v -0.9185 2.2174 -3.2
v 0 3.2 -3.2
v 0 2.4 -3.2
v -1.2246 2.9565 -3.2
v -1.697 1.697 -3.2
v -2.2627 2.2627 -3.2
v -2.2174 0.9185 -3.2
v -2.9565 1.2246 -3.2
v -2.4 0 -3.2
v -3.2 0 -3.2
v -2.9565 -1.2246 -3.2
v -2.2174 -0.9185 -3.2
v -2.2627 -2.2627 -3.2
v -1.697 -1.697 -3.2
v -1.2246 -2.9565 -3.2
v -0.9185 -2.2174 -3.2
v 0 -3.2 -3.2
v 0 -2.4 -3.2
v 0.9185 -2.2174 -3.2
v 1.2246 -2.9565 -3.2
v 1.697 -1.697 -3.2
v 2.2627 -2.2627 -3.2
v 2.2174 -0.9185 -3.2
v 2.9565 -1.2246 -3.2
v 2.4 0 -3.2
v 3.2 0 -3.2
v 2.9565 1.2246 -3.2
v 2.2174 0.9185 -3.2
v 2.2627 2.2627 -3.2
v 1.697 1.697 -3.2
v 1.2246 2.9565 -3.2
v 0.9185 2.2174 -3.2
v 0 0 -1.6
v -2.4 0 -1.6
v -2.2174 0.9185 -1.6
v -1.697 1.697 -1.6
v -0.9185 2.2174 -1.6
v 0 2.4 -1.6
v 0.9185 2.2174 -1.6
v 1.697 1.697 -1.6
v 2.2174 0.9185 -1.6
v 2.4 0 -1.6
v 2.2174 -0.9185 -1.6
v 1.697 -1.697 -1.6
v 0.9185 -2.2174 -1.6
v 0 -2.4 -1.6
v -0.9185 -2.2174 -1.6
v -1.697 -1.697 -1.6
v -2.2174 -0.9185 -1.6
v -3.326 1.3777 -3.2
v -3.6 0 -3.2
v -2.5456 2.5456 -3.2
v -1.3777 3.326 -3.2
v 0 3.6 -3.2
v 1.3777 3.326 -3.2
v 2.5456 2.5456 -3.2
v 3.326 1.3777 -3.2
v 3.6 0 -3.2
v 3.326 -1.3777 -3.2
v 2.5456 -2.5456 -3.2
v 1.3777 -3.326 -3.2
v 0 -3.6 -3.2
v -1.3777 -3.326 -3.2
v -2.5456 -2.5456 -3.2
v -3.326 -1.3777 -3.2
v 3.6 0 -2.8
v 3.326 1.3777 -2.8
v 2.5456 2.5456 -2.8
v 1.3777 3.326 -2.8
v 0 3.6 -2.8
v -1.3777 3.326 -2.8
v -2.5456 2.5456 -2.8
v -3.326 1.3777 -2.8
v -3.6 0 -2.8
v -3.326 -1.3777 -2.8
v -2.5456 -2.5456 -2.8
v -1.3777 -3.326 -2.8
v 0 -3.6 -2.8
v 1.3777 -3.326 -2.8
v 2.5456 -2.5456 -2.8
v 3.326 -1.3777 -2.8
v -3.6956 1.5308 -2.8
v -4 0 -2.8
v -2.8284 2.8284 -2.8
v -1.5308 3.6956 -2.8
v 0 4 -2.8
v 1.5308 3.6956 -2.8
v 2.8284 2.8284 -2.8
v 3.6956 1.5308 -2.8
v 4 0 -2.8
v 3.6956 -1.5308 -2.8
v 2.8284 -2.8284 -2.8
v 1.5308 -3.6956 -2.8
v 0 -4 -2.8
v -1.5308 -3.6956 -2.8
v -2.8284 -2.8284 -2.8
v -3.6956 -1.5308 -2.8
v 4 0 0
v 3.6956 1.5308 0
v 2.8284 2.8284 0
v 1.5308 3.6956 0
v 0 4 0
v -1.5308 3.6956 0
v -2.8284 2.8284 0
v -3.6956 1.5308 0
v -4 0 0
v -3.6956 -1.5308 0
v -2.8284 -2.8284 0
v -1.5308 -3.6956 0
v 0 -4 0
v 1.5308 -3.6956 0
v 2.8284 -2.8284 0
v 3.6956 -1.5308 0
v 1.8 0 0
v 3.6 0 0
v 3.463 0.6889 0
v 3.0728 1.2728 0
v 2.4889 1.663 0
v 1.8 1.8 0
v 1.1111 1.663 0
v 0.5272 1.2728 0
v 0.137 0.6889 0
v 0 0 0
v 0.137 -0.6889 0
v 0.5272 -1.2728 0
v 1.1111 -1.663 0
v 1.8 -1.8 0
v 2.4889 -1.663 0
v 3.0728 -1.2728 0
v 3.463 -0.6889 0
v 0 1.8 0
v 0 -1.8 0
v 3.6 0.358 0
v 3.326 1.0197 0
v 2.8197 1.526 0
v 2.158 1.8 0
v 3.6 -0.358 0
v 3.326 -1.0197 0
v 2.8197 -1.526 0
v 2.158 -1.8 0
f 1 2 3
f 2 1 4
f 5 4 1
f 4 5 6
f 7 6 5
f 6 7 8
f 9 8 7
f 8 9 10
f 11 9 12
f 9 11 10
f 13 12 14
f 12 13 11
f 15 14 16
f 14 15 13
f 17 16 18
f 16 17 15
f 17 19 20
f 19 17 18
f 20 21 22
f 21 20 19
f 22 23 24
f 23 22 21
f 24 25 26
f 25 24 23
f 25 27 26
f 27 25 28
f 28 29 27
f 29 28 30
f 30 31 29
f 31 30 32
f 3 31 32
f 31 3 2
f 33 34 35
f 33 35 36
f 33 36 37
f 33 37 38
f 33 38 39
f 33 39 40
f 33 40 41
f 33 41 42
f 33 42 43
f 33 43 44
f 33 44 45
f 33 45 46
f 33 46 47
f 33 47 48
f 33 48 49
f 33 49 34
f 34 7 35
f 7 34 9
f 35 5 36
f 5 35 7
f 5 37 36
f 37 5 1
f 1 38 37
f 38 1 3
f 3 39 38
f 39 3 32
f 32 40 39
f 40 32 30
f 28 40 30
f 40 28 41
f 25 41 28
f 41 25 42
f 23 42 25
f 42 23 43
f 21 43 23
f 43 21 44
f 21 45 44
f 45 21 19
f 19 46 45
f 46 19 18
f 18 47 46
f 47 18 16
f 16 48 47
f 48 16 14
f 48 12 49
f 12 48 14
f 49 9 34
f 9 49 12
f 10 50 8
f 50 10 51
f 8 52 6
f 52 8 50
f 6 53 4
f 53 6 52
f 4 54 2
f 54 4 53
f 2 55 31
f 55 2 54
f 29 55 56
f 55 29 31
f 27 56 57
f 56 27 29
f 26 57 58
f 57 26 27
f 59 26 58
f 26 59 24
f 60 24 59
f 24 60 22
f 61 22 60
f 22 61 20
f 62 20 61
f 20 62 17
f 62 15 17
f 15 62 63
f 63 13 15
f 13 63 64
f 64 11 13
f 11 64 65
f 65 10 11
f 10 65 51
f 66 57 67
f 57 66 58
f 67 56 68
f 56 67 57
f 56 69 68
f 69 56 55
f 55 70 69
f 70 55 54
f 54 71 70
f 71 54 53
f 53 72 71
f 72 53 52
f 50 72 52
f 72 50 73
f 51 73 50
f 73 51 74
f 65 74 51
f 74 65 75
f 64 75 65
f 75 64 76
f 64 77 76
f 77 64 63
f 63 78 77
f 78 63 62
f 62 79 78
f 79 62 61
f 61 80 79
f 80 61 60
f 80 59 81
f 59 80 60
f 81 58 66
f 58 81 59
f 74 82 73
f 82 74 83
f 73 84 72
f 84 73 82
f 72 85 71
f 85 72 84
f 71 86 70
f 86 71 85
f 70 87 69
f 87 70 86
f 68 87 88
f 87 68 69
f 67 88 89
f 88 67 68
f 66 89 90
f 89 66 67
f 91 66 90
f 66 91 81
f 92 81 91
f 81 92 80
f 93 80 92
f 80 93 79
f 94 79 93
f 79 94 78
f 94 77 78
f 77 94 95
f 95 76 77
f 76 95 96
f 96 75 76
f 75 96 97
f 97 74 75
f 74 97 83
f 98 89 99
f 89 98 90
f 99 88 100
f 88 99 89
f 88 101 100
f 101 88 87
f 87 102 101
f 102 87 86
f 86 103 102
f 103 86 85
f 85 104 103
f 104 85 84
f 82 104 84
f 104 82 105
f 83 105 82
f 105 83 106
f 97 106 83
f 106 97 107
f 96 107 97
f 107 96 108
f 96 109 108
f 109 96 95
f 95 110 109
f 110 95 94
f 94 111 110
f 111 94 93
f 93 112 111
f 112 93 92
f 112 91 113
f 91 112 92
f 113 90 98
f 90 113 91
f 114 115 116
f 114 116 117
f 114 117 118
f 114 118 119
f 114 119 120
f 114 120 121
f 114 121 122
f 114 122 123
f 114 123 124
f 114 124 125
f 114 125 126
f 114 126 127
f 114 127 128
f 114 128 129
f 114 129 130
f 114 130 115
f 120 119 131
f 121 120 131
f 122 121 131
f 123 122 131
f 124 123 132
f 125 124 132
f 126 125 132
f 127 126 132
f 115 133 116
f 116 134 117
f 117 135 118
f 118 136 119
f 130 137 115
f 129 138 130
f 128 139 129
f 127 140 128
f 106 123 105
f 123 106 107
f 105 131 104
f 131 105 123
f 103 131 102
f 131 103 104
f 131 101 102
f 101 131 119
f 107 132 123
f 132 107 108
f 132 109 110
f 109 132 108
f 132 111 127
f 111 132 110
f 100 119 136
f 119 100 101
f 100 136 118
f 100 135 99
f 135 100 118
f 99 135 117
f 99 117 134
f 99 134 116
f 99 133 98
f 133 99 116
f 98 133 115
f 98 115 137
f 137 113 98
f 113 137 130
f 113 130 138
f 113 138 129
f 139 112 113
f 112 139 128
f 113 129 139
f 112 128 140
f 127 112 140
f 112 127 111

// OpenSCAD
// file: ../p/4-4ring3.scad
use <../lib.scad>
function ldraw_lib__4_4ring3() = [
// 0 Ring  3 x 1.0
// 0 Name: 4-4ring3.dat
// 0 Author: James Jessiman
// 0 !LDRAW_ORG Primitive UPDATE 2009-01
// 0 !LICENSE Licensed under CC BY 4.0 : see CAreadme.txt
// 
// 0 BFC CERTIFY CCW
  [0,"BFC","CERTIFY"],
  [0,"BFC","CCW"],
// 
// 0 !HISTORY 1998-12-15 [PTadmin] Official Update 1998-10
// 0 !HISTORY 2002-04-05 [hafhead] Added BFC statement
// 0 !HISTORY 2002-04-25 [PTadmin] Official Update 2002-02
// 0 !HISTORY 2007-06-24 [PTadmin] Header formatted for Contributor Agreement
// 0 !HISTORY 2008-07-01 [PTadmin] Official Update 2008-01
// 0 !HISTORY 2008-08-26 [cwdee] Switch polygon winding and rename
// 0 !HISTORY 2009-05-02 [PTadmin] Official Update 2009-01
// 
// 
// 4 16 -1.5308 0 3.6956 -1.1481 0 2.7717 0 0 3 0 0 4
  [4,16,-1.5308,0,3.6956,-1.1481,0,2.7717,0,0,3,0,0,4],
// 4 16 -2.8284 0 2.8284 -2.1213 0 2.1213 -1.1481 0 2.7717 -1.5308 0 3.6956
  [4,16,-2.8284,0,2.8284,-2.1213,0,2.1213,-1.1481,0,2.7717,-1.5308,0,3.6956],
// 4 16 -3.6956 0 1.5308 -2.7717 0 1.1481 -2.1213 0 2.1213 -2.8284 0 2.8284
  [4,16,-3.6956,0,1.5308,-2.7717,0,1.1481,-2.1213,0,2.1213,-2.8284,0,2.8284],
// 4 16 -4 0 0 -3 0 0 -2.7717 0 1.1481 -3.6956 0 1.5308
  [4,16,-4,0,0,-3,0,0,-2.7717,0,1.1481,-3.6956,0,1.5308],
// 4 16 -3.6956 0 -1.5308 -2.7717 0 -1.1481 -3 0 0 -4 0 0
  [4,16,-3.6956,0,-1.5308,-2.7717,0,-1.1481,-3,0,0,-4,0,0],
// 4 16 -2.8284 0 -2.8284 -2.1213 0 -2.1213 -2.7717 0 -1.1481 -3.6956 0 -1.5308
  [4,16,-2.8284,0,-2.8284,-2.1213,0,-2.1213,-2.7717,0,-1.1481,-3.6956,0,-1.5308],
// 4 16 -1.5308 0 -3.6956 -1.1481 0 -2.7717 -2.1213 0 -2.1213 -2.8284 0 -2.8284
  [4,16,-1.5308,0,-3.6956,-1.1481,0,-2.7717,-2.1213,0,-2.1213,-2.8284,0,-2.8284],
// 4 16 0 0 -4 0 0 -3 -1.1481 0 -2.7717 -1.5308 0 -3.6956
  [4,16,0,0,-4,0,0,-3,-1.1481,0,-2.7717,-1.5308,0,-3.6956],
// 4 16 1.5308 0 -3.6956 1.1481 0 -2.7717 0 0 -3 0 0 -4
  [4,16,1.5308,0,-3.6956,1.1481,0,-2.7717,0,0,-3,0,0,-4],
// 4 16 2.8284 0 -2.8284 2.1213 0 -2.1213 1.1481 0 -2.7717 1.5308 0 -3.6956
  [4,16,2.8284,0,-2.8284,2.1213,0,-2.1213,1.1481,0,-2.7717,1.5308,0,-3.6956],
// 4 16 3.6956 0 -1.5308 2.7717 0 -1.1481 2.1213 0 -2.1213 2.8284 0 -2.8284
  [4,16,3.6956,0,-1.5308,2.7717,0,-1.1481,2.1213,0,-2.1213,2.8284,0,-2.8284],
// 4 16 4 0 0 3 0 0 2.7717 0 -1.1481 3.6956 0 -1.5308
  [4,16,4,0,0,3,0,0,2.7717,0,-1.1481,3.6956,0,-1.5308],
// 4 16 3.6956 0 1.5308 2.7717 0 1.1481 3 0 0 4 0 0
  [4,16,3.6956,0,1.5308,2.7717,0,1.1481,3,0,0,4,0,0],
// 4 16 2.8284 0 2.8284 2.1213 0 2.1213 2.7717 0 1.1481 3.6956 0 1.5308
  [4,16,2.8284,0,2.8284,2.1213,0,2.1213,2.7717,0,1.1481,3.6956,0,1.5308],
// 4 16 1.5308 0 3.6956 1.1481 0 2.7717 2.1213 0 2.1213 2.8284 0 2.8284
  [4,16,1.5308,0,3.6956,1.1481,0,2.7717,2.1213,0,2.1213,2.8284,0,2.8284],
// 4 16 0 0 4 0 0 3 1.1481 0 2.7717 1.5308 0 3.6956
  [4,16,0,0,4,0,0,3,1.1481,0,2.7717,1.5308,0,3.6956],
// 0
];
module ldraw_lib__4_4ring3(step=0, col=false, unit=2/5, alt=false, line=0.2, solid=!$preview)
    makepoly(ldraw_lib__4_4ring3(), step=step, col=col, unit=unit, alt=alt, line=line, solid=solid);
ldraw_lib__4_4ring3(line=0.2);
// file: ../p/4-4cylc.scad
use <../lib.scad>
use <4-4cyli.scad>
use <4-4disc.scad>
use <4-4edge.scad>
function ldraw_lib__4_4cylc() = [
// 0 Cylinder Closed 1.0
// 0 Name: 4-4cylc.dat
// 0 Author: Alex Taylor [anathema]
// 0 !LDRAW_ORG Primitive UPDATE 2009-02
// 0 !LICENSE Licensed under CC BY 4.0 : see CAreadme.txt
// 
// 0 BFC CERTIFY CCW
  [0,"BFC","CERTIFY"],
  [0,"BFC","CCW"],
// 
// 0 !HISTORY 2008-12-29 [cwdee] Removed one disc
// 0 !HISTORY 2009-09-03 [PTadmin] Official Update 2009-02
// 
// 
// 1 16 0 0 0 1 0 0 0 1 0 0 0 1 4-4edge.dat
  [1,16,0,0,0,1,0,0,0,1,0,0,0,1, ldraw_lib__4_4edge()],
// 1 16 0 1 0 1 0 0 0 1 0 0 0 1 4-4edge.dat
  [1,16,0,1,0,1,0,0,0,1,0,0,0,1, ldraw_lib__4_4edge()],
// 1 16 0 0 0 1 0 0 0 1 0 0 0 1 4-4disc.dat
  [1,16,0,0,0,1,0,0,0,1,0,0,0,1, ldraw_lib__4_4disc()],
// 1 16 0 0 0 1 0 0 0 1 0 0 0 1 4-4cyli.dat
  [1,16,0,0,0,1,0,0,0,1,0,0,0,1, ldraw_lib__4_4cyli()],
// 0
];
module ldraw_lib__4_4cylc(step=0, col=false, unit=2/5, alt=false, line=0.2, solid=!$preview)
    makepoly(ldraw_lib__4_4cylc(), step=step, col=col, unit=unit, alt=alt, line=line, solid=solid);
ldraw_lib__4_4cylc(line=0.2);
// file: ../p/4-4edge.scad
use <../lib.scad>
function ldraw_lib__4_4edge() = [
// 0 Circle 1.0
// 0 Name: 4-4edge.dat
// 0 Author: James Jessiman
// 0 !LDRAW_ORG Primitive UPDATE 2017-01
// 0 !LICENSE Licensed under CC BY 4.0 : see CAreadme.txt
// 
// 0 BFC CERTIFY CCW
  [0,"BFC","CERTIFY"],
  [0,"BFC","CCW"],
// 
// 0 !HISTORY 1998-12-15 [PTadmin] Official Update 1998-10
// 0 !HISTORY 2005-12-28 [PTadmin] Official Update 2005-01
// 0 !HISTORY 2007-06-24 [PTadmin] Header formatted for Contributor Agreement
// 0 !HISTORY 2008-07-01 [PTadmin] Official Update 2008-01
// 0 !HISTORY 2017-01-15 [Steffen] BFCed
// 0 !HISTORY 2017-12-30 [PTadmin] Official Update 2017-01
// 
// 
// 2 24 1 0 0 0.9239 0 0.3827
  [2,24,1,0,0,0.9239,0,0.3827],
// 2 24 0.9239 0 0.3827 0.7071 0 0.7071
  [2,24,0.9239,0,0.3827,0.7071,0,0.7071],
// 2 24 0.7071 0 0.7071 0.3827 0 0.9239
  [2,24,0.7071,0,0.7071,0.3827,0,0.9239],
// 2 24 0.3827 0 0.9239 0 0 1
  [2,24,0.3827,0,0.9239,0,0,1],
// 2 24 0 0 1 -0.3827 0 0.9239
  [2,24,0,0,1,-0.3827,0,0.9239],
// 2 24 -0.3827 0 0.9239 -0.7071 0 0.7071
  [2,24,-0.3827,0,0.9239,-0.7071,0,0.7071],
// 2 24 -0.7071 0 0.7071 -0.9239 0 0.3827
  [2,24,-0.7071,0,0.7071,-0.9239,0,0.3827],
// 2 24 -0.9239 0 0.3827 -1 0 -0
  [2,24,-0.9239,0,0.3827,-1,0,-0],
// 2 24 -1 0 -0 -0.9239 0 -0.3827
  [2,24,-1,0,-0,-0.9239,0,-0.3827],
// 2 24 -0.9239 0 -0.3827 -0.7071 0 -0.7071
  [2,24,-0.9239,0,-0.3827,-0.7071,0,-0.7071],
// 2 24 -0.7071 0 -0.7071 -0.3827 0 -0.9239
  [2,24,-0.7071,0,-0.7071,-0.3827,0,-0.9239],
// 2 24 -0.3827 0 -0.9239 0 0 -1
  [2,24,-0.3827,0,-0.9239,0,0,-1],
// 2 24 0 0 -1 0.3827 0 -0.9239
  [2,24,0,0,-1,0.3827,0,-0.9239],
// 2 24 0.3827 0 -0.9239 0.7071 0 -0.7071
  [2,24,0.3827,0,-0.9239,0.7071,0,-0.7071],
// 2 24 0.7071 0 -0.7071 0.9239 0 -0.3827
  [2,24,0.7071,0,-0.7071,0.9239,0,-0.3827],
// 2 24 0.9239 0 -0.3827 1 0 0
  [2,24,0.9239,0,-0.3827,1,0,0],
];
module ldraw_lib__4_4edge(step=0, col=false, unit=2/5, alt=false, line=0.2, solid=!$preview)
    makepoly(ldraw_lib__4_4edge(), step=step, col=col, unit=unit, alt=alt, line=line, solid=solid);
ldraw_lib__4_4edge(line=0.2);
// file: ../p/4-4cyli.scad
use <../lib.scad>
function ldraw_lib__4_4cyli() = [
// 0 Cylinder 1.0
// 0 Name: 4-4cyli.dat
// 0 Author: James Jessiman
// 0 !LDRAW_ORG Primitive UPDATE 2005-01
// 0 !LICENSE Licensed under CC BY 4.0 : see CAreadme.txt
// 
// 0 BFC CERTIFY CCW
  [0,"BFC","CERTIFY"],
  [0,"BFC","CCW"],
// 
// 0 !HISTORY 1998-12-15 [PTadmin] Official Update 1998-10
// 0 !HISTORY 2002-03-23 [sbliss] Added BFC statement; merged headers from files in distributions LDraw 0.27 and Complete.
// 0 !HISTORY 2002-04-25 [PTadmin] Official Update 2002-02
// 0 !HISTORY 2004-12-14 [guyvivan] BFC CCW
// 0 !HISTORY 2005-12-28 [PTadmin] Official Update 2005-01
// 0 !HISTORY 2007-06-24 [PTadmin] Header formatted for Contributor Agreement
// 0 !HISTORY 2008-07-01 [PTadmin] Official Update 2008-01
// 
// 
// 4 16 1 1 0 0.9239 1 0.3827 0.9239 0 0.3827 1 0 0
  [4,16,1,1,0,0.9239,1,0.3827,0.9239,0,0.3827,1,0,0],
// 5 24 1 0 0 1 1 0 0.9239 0 0.3827 0.9239 0 -0.3827
  [5,24,1,0,0,1,1,0,0.9239,0,0.3827,0.9239,0,-0.3827],
// 4 16 0.9239 1 0.3827 0.7071 1 0.7071 0.7071 0 0.7071 0.9239 0 0.3827
  [4,16,0.9239,1,0.3827,0.7071,1,0.7071,0.7071,0,0.7071,0.9239,0,0.3827],
// 5 24 0.9239 0 0.3827 0.9239 1 0.3827 0.7071 0 0.7071 1 0 0
  [5,24,0.9239,0,0.3827,0.9239,1,0.3827,0.7071,0,0.7071,1,0,0],
// 4 16 0.7071 1 0.7071 0.3827 1 0.9239 0.3827 0 0.9239 0.7071 0 0.7071
  [4,16,0.7071,1,0.7071,0.3827,1,0.9239,0.3827,0,0.9239,0.7071,0,0.7071],
// 5 24 0.7071 0 0.7071 0.7071 1 0.7071 0.3827 0 0.9239 0.9239 0 0.3827
  [5,24,0.7071,0,0.7071,0.7071,1,0.7071,0.3827,0,0.9239,0.9239,0,0.3827],
// 4 16 0.3827 1 0.9239 0 1 1 0 0 1 0.3827 0 0.9239
  [4,16,0.3827,1,0.9239,0,1,1,0,0,1,0.3827,0,0.9239],
// 5 24 0.3827 0 0.9239 0.3827 1 0.9239 0 0 1 0.7071 0 0.7071
  [5,24,0.3827,0,0.9239,0.3827,1,0.9239,0,0,1,0.7071,0,0.7071],
// 4 16 0 1 1 -0.3827 1 0.9239 -0.3827 0 0.9239 0 0 1
  [4,16,0,1,1,-0.3827,1,0.9239,-0.3827,0,0.9239,0,0,1],
// 5 24 0 0 1 0 1 1 -0.3827 0 0.9239 0.3827 0 0.9239
  [5,24,0,0,1,0,1,1,-0.3827,0,0.9239,0.3827,0,0.9239],
// 4 16 -0.3827 1 0.9239 -0.7071 1 0.7071 -0.7071 0 0.7071 -0.3827 0 0.9239
  [4,16,-0.3827,1,0.9239,-0.7071,1,0.7071,-0.7071,0,0.7071,-0.3827,0,0.9239],
// 5 24 -0.3827 0 0.9239 -0.3827 1 0.9239 -0.7071 0 0.7071 0 0 1
  [5,24,-0.3827,0,0.9239,-0.3827,1,0.9239,-0.7071,0,0.7071,0,0,1],
// 4 16 -0.7071 1 0.7071 -0.9239 1 0.3827 -0.9239 0 0.3827 -0.7071 0 0.7071
  [4,16,-0.7071,1,0.7071,-0.9239,1,0.3827,-0.9239,0,0.3827,-0.7071,0,0.7071],
// 5 24 -0.7071 0 0.7071 -0.7071 1 0.7071 -0.9239 0 0.3827 -0.3827 0 0.9239
  [5,24,-0.7071,0,0.7071,-0.7071,1,0.7071,-0.9239,0,0.3827,-0.3827,0,0.9239],
// 4 16 -0.9239 1 0.3827 -1 1 0 -1 0 0 -0.9239 0 0.3827
  [4,16,-0.9239,1,0.3827,-1,1,0,-1,0,0,-0.9239,0,0.3827],
// 5 24 -0.9239 0 0.3827 -0.9239 1 0.3827 -1 0 0 -0.7071 0 0.7071
  [5,24,-0.9239,0,0.3827,-0.9239,1,0.3827,-1,0,0,-0.7071,0,0.7071],
// 4 16 -1 1 0 -0.9239 1 -0.3827 -0.9239 0 -0.3827 -1 0 0
  [4,16,-1,1,0,-0.9239,1,-0.3827,-0.9239,0,-0.3827,-1,0,0],
// 5 24 -1 0 0 -1 1 0 -0.9239 0 -0.3827 -0.9239 0 0.3827
  [5,24,-1,0,0,-1,1,0,-0.9239,0,-0.3827,-0.9239,0,0.3827],
// 4 16 -0.9239 1 -0.3827 -0.7071 1 -0.7071 -0.7071 0 -0.7071 -0.9239 0 -0.3827
  [4,16,-0.9239,1,-0.3827,-0.7071,1,-0.7071,-0.7071,0,-0.7071,-0.9239,0,-0.3827],
// 5 24 -0.9239 0 -0.3827 -0.9239 1 -0.3827 -0.7071 0 -0.7071 -1 0 0
  [5,24,-0.9239,0,-0.3827,-0.9239,1,-0.3827,-0.7071,0,-0.7071,-1,0,0],
// 4 16 -0.7071 1 -0.7071 -0.3827 1 -0.9239 -0.3827 0 -0.9239 -0.7071 0 -0.7071
  [4,16,-0.7071,1,-0.7071,-0.3827,1,-0.9239,-0.3827,0,-0.9239,-0.7071,0,-0.7071],
// 5 24 -0.7071 0 -0.7071 -0.7071 1 -0.7071 -0.3827 0 -0.9239 -0.9239 0 -0.3827
  [5,24,-0.7071,0,-0.7071,-0.7071,1,-0.7071,-0.3827,0,-0.9239,-0.9239,0,-0.3827],
// 4 16 -0.3827 1 -0.9239 0 1 -1 0 0 -1 -0.3827 0 -0.9239
  [4,16,-0.3827,1,-0.9239,0,1,-1,0,0,-1,-0.3827,0,-0.9239],
// 5 24 -0.3827 0 -0.9239 -0.3827 1 -0.9239 0 0 -1 -0.7071 0 -0.7071
  [5,24,-0.3827,0,-0.9239,-0.3827,1,-0.9239,0,0,-1,-0.7071,0,-0.7071],
// 4 16 0 1 -1 0.3827 1 -0.9239 0.3827 0 -0.9239 0 0 -1
  [4,16,0,1,-1,0.3827,1,-0.9239,0.3827,0,-0.9239,0,0,-1],
// 5 24 0 0 -1 0 1 -1 0.3827 0 -0.9239 -0.3827 0 -0.9239
  [5,24,0,0,-1,0,1,-1,0.3827,0,-0.9239,-0.3827,0,-0.9239],
// 4 16 0.3827 1 -0.9239 0.7071 1 -0.7071 0.7071 0 -0.7071 0.3827 0 -0.9239
  [4,16,0.3827,1,-0.9239,0.7071,1,-0.7071,0.7071,0,-0.7071,0.3827,0,-0.9239],
// 5 24 0.3827 0 -0.9239 0.3827 1 -0.9239 0.7071 0 -0.7071 0 0 -1
  [5,24,0.3827,0,-0.9239,0.3827,1,-0.9239,0.7071,0,-0.7071,0,0,-1],
// 4 16 0.7071 1 -0.7071 0.9239 1 -0.3827 0.9239 0 -0.3827 0.7071 0 -0.7071
  [4,16,0.7071,1,-0.7071,0.9239,1,-0.3827,0.9239,0,-0.3827,0.7071,0,-0.7071],
// 5 24 0.7071 0 -0.7071 0.7071 1 -0.7071 0.9239 0 -0.3827 0.3827 0 -0.9239
  [5,24,0.7071,0,-0.7071,0.7071,1,-0.7071,0.9239,0,-0.3827,0.3827,0,-0.9239],
// 4 16 0.9239 1 -0.3827 1 1 0 1 0 0 0.9239 0 -0.3827
  [4,16,0.9239,1,-0.3827,1,1,0,1,0,0,0.9239,0,-0.3827],
// 5 24 0.9239 0 -0.3827 0.9239 1 -0.3827 1 0 0 0.7071 0 -0.7071
  [5,24,0.9239,0,-0.3827,0.9239,1,-0.3827,1,0,0,0.7071,0,-0.7071],
// 0
];
module ldraw_lib__4_4cyli(step=0, col=false, unit=2/5, alt=false, line=0.2, solid=!$preview)
    makepoly(ldraw_lib__4_4cyli(), step=step, col=col, unit=unit, alt=alt, line=line, solid=solid);
ldraw_lib__4_4cyli(line=0.2);
// file: ../p/empty.scad
use <../lib.scad>
function ldraw_lib__empty() = [
// 0 Empty
// 0 Name: empty.dat
// 0 Author: Steffen [Steffen]
// 0 !LDRAW_ORG Primitive UPDATE 2015-01
// 0 !LICENSE Licensed under CC BY 4.0 : see CAreadme.txt
// 
// 0 BFC CERTIFY CCW
  [0,"BFC","CERTIFY"],
  [0,"BFC","CCW"],
// 
// 0 !HISTORY 2015-10-11 [PTadmin] Official Update 2015-01
// 
// 
// 0 // Tool MLCad cannot handle really empty files. This file is used as a workaround.
// 0 // It exceptionally contains forbidden non-LDRAW standard syntax to satisfy MLCad until it is fixed OR a different editor has become the de-facto LDRAW standard.
// 0 // The line being used here is an "impossible" conditional line which never should be visible,
// 0 // additionally hidden by a syntax explicitly hiding it from displaying.
// 
// 0 MLCAD HIDE 5 24 0 0 0 0.0001 0 0 0.0001 -0.0001 0 0 0 0
];
module ldraw_lib__empty(step=0, col=false, unit=2/5, alt=false, line=0.2, solid=!$preview)
    makepoly(ldraw_lib__empty(), step=step, col=col, unit=unit, alt=alt, line=line, solid=solid);
ldraw_lib__empty(line=0.2);
// file: ../p/stud4o.scad
use <../lib.scad>
use <4-4cylc.scad>
use <4-4ring3.scad>
function ldraw_lib__stud4o() = [
// 0 Stud Tube Open without Outer Cylinder
// 0 Name: stud4o.dat
// 0 Author: Magnus Forsberg [MagFors]
// 0 !LDRAW_ORG Primitive UPDATE 2011-02
// 0 !LICENSE Licensed under CC BY 4.0 : see CAreadme.txt
// 
// 0 !HELP This stud is a "antistud" to be used like a underside stud,
// 0 !HELP but without the outer cylinder.
// 0 !HELP 1 47 0 0 0 1 0 0 0 1 0 0 0 1 stud4.dat
// 
// 0 BFC CERTIFY CCW
  [0,"BFC","CERTIFY"],
  [0,"BFC","CCW"],
// 
// 0 !HISTORY 2011-12-29 [PTadmin] Official Update 2011-02
// 
// 
// 1 16 0 -4 0 2 0 0 0 1 0 0 0 2 4-4ring3.dat
  [1,16,0,-4,0,2,0,0,0,1,0,0,0,2, ldraw_lib__4_4ring3()],
// 0 BFC INVERTNEXT
  [0,"BFC","INVERTNEXT"],
// 1 16 0 0 0 -6 0 0 0 -4 0 0 0 6 4-4cylc.dat
  [1,16,0,0,0,-6,0,0,0,-4,0,0,0,6, ldraw_lib__4_4cylc()],
];
module ldraw_lib__stud4o(step=0, col=false, unit=2/5, alt=false, line=0.2, solid=!$preview)
    makepoly(ldraw_lib__stud4o(), step=step, col=col, unit=unit, alt=alt, line=line, solid=solid);
ldraw_lib__stud4o(line=0.2);
// file: ../p/4-4ring9.scad
use <../lib.scad>
function ldraw_lib__4_4ring9() = [
// 0 Ring  9 x 1.0
// 0 Name: 4-4ring9.dat
// 0 Author: Magnus Forsberg [MagFors]
// 0 !LDRAW_ORG Primitive UPDATE 2024-01
// 0 !LICENSE Licensed under CC BY 4.0 : see CAreadme.txt
// 
// 0 BFC CERTIFY CCW
  [0,"BFC","CERTIFY"],
  [0,"BFC","CCW"],
// 
// 0 !HISTORY 2004-04-22 [PTadmin] Official Update 2004-02
// 0 !HISTORY 2007-06-24 [PTadmin] Header formatted for Contributor Agreement
// 0 !HISTORY 2008-07-01 [PTadmin] Official Update 2008-01
// 0 !HISTORY 2024-01-04 [MagFors] Complete regeneration, original by jriley
// 0 !HISTORY 2024-01-29 [OrionP] Official Update 2024-01
// 
// 4 16 10 0 0 9.239 0 3.827 8.3151 0 3.4443 9 0 0
  [4,16,10,0,0,9.239,0,3.827,8.3151,0,3.4443,9,0,0],
// 4 16 9.239 0 3.827 7.071 0 7.071 6.3639 0 6.3639 8.3151 0 3.4443
  [4,16,9.239,0,3.827,7.071,0,7.071,6.3639,0,6.3639,8.3151,0,3.4443],
// 4 16 7.071 0 7.071 3.827 0 9.239 3.4443 0 8.3151 6.3639 0 6.3639
  [4,16,7.071,0,7.071,3.827,0,9.239,3.4443,0,8.3151,6.3639,0,6.3639],
// 4 16 3.827 0 9.239 0 0 10 0 0 9 3.4443 0 8.3151
  [4,16,3.827,0,9.239,0,0,10,0,0,9,3.4443,0,8.3151],
// 4 16 0 0 10 -3.827 0 9.239 -3.4443 0 8.3151 0 0 9
  [4,16,0,0,10,-3.827,0,9.239,-3.4443,0,8.3151,0,0,9],
// 4 16 -3.827 0 9.239 -7.071 0 7.071 -6.3639 0 6.3639 -3.4443 0 8.3151
  [4,16,-3.827,0,9.239,-7.071,0,7.071,-6.3639,0,6.3639,-3.4443,0,8.3151],
// 4 16 -7.071 0 7.071 -9.239 0 3.827 -8.3151 0 3.4443 -6.3639 0 6.3639
  [4,16,-7.071,0,7.071,-9.239,0,3.827,-8.3151,0,3.4443,-6.3639,0,6.3639],
// 4 16 -9.239 0 3.827 -10 0 0 -9 0 0 -8.3151 0 3.4443
  [4,16,-9.239,0,3.827,-10,0,0,-9,0,0,-8.3151,0,3.4443],
// 4 16 -10 0 0 -9.239 0 -3.827 -8.3151 0 -3.4443 -9 0 0
  [4,16,-10,0,0,-9.239,0,-3.827,-8.3151,0,-3.4443,-9,0,0],
// 4 16 -9.239 0 -3.827 -7.071 0 -7.071 -6.3639 0 -6.3639 -8.3151 0 -3.4443
  [4,16,-9.239,0,-3.827,-7.071,0,-7.071,-6.3639,0,-6.3639,-8.3151,0,-3.4443],
// 4 16 -7.071 0 -7.071 -3.827 0 -9.239 -3.4443 0 -8.3151 -6.3639 0 -6.3639
  [4,16,-7.071,0,-7.071,-3.827,0,-9.239,-3.4443,0,-8.3151,-6.3639,0,-6.3639],
// 4 16 -3.827 0 -9.239 0 0 -10 0 0 -9 -3.4443 0 -8.3151
  [4,16,-3.827,0,-9.239,0,0,-10,0,0,-9,-3.4443,0,-8.3151],
// 4 16 0 0 -10 3.827 0 -9.239 3.4443 0 -8.3151 0 0 -9
  [4,16,0,0,-10,3.827,0,-9.239,3.4443,0,-8.3151,0,0,-9],
// 4 16 3.827 0 -9.239 7.071 0 -7.071 6.3639 0 -6.3639 3.4443 0 -8.3151
  [4,16,3.827,0,-9.239,7.071,0,-7.071,6.3639,0,-6.3639,3.4443,0,-8.3151],
// 4 16 7.071 0 -7.071 9.239 0 -3.827 8.3151 0 -3.4443 6.3639 0 -6.3639
  [4,16,7.071,0,-7.071,9.239,0,-3.827,8.3151,0,-3.4443,6.3639,0,-6.3639],
// 4 16 9.239 0 -3.827 10 0 0 9 0 0 8.3151 0 -3.4443
  [4,16,9.239,0,-3.827,10,0,0,9,0,0,8.3151,0,-3.4443],
// 0 // Build by LDPartEditor (PrimGen 2.X)
];
module ldraw_lib__4_4ring9(step=0, col=false, unit=2/5, alt=false, line=0.2, solid=!$preview)
    makepoly(ldraw_lib__4_4ring9(), step=step, col=col, unit=unit, alt=alt, line=line, solid=solid);
ldraw_lib__4_4ring9(line=0.2);
// file: ../p/4-4ring8.scad
use <../lib.scad>
function ldraw_lib__4_4ring8() = [
// 0 Ring  8 x 1.0
// 0 Name: 4-4ring8.dat
// 0 Author: Steffen [Steffen]
// 0 !LDRAW_ORG Primitive UPDATE 2012-01
// 0 !LICENSE Licensed under CC BY 4.0 : see CAreadme.txt
// 
// 0 BFC CERTIFY CCW
  [0,"BFC","CERTIFY"],
  [0,"BFC","CCW"],
// 
// 0 !HISTORY 2003-12-19 [PTadmin] Official Update 2003-03
// 0 !HISTORY 2007-06-24 [PTadmin] Header formatted for Contributor Agreement
// 0 !HISTORY 2008-07-01 [PTadmin] Official Update 2008-01
// 0 !HISTORY 2012-02-16 [Philo] Changed to CCW
// 0 !HISTORY 2012-03-30 [PTadmin] Official Update 2012-01
// 
// 
// 4 16 9 0 0 8.3151 0 3.4443 7.3912 0 3.0616 8 0 0
  [4,16,9,0,0,8.3151,0,3.4443,7.3912,0,3.0616,8,0,0],
// 4 16 8.3151 0 3.4443 6.3639 0 6.3639 5.6568 0 5.6568 7.3912 0 3.0616
  [4,16,8.3151,0,3.4443,6.3639,0,6.3639,5.6568,0,5.6568,7.3912,0,3.0616],
// 4 16 6.3639 0 6.3639 3.4443 0 8.3151 3.0616 0 7.3912 5.6568 0 5.6568
  [4,16,6.3639,0,6.3639,3.4443,0,8.3151,3.0616,0,7.3912,5.6568,0,5.6568],
// 4 16 3.4443 0 8.3151 0 0 9 0 0 8 3.0616 0 7.3912
  [4,16,3.4443,0,8.3151,0,0,9,0,0,8,3.0616,0,7.3912],
// 4 16 0 0 9 -3.4443 0 8.3151 -3.0616 0 7.3912 0 0 8
  [4,16,0,0,9,-3.4443,0,8.3151,-3.0616,0,7.3912,0,0,8],
// 4 16 -3.4443 0 8.3151 -6.3639 0 6.3639 -5.6568 0 5.6568 -3.0616 0 7.3912
  [4,16,-3.4443,0,8.3151,-6.3639,0,6.3639,-5.6568,0,5.6568,-3.0616,0,7.3912],
// 4 16 -6.3639 0 6.3639 -8.3151 0 3.4443 -7.3912 0 3.0616 -5.6568 0 5.6568
  [4,16,-6.3639,0,6.3639,-8.3151,0,3.4443,-7.3912,0,3.0616,-5.6568,0,5.6568],
// 4 16 -8.3151 0 3.4443 -9 0 0 -8 0 0 -7.3912 0 3.0616
  [4,16,-8.3151,0,3.4443,-9,0,0,-8,0,0,-7.3912,0,3.0616],
// 4 16 -9 0 0 -8.3151 0 -3.4443 -7.3912 0 -3.0616 -8 0 0
  [4,16,-9,0,0,-8.3151,0,-3.4443,-7.3912,0,-3.0616,-8,0,0],
// 4 16 -8.3151 0 -3.4443 -6.3639 0 -6.3639 -5.6568 0 -5.6568 -7.3912 0 -3.0616
  [4,16,-8.3151,0,-3.4443,-6.3639,0,-6.3639,-5.6568,0,-5.6568,-7.3912,0,-3.0616],
// 4 16 -6.3639 0 -6.3639 -3.4443 0 -8.3151 -3.0616 0 -7.3912 -5.6568 0 -5.6568
  [4,16,-6.3639,0,-6.3639,-3.4443,0,-8.3151,-3.0616,0,-7.3912,-5.6568,0,-5.6568],
// 4 16 -3.4443 0 -8.3151 0 0 -9 0 0 -8 -3.0616 0 -7.3912
  [4,16,-3.4443,0,-8.3151,0,0,-9,0,0,-8,-3.0616,0,-7.3912],
// 4 16 0 0 -9 3.4443 0 -8.3151 3.0616 0 -7.3912 0 0 -8
  [4,16,0,0,-9,3.4443,0,-8.3151,3.0616,0,-7.3912,0,0,-8],
// 4 16 3.4443 0 -8.3151 6.3639 0 -6.3639 5.6568 0 -5.6568 3.0616 0 -7.3912
  [4,16,3.4443,0,-8.3151,6.3639,0,-6.3639,5.6568,0,-5.6568,3.0616,0,-7.3912],
// 4 16 6.3639 0 -6.3639 8.3151 0 -3.4443 7.3912 0 -3.0616 5.6568 0 -5.6568
  [4,16,6.3639,0,-6.3639,8.3151,0,-3.4443,7.3912,0,-3.0616,5.6568,0,-5.6568],
// 4 16 8.3151 0 -3.4443 9 0 0 8 0 0 7.3912 0 -3.0616
  [4,16,8.3151,0,-3.4443,9,0,0,8,0,0,7.3912,0,-3.0616],
];
module ldraw_lib__4_4ring8(step=0, col=false, unit=2/5, alt=false, line=0.2, solid=!$preview)
    makepoly(ldraw_lib__4_4ring8(), step=step, col=col, unit=unit, alt=alt, line=line, solid=solid);
ldraw_lib__4_4ring8(line=0.2);
// file: ../p/4-4cylo.scad
use <../lib.scad>
use <4-4cyli.scad>
use <4-4edge.scad>
function ldraw_lib__4_4cylo() = [
// 0 Cylinder Open 1.0
// 0 Name: 4-4cylo.dat
// 0 Author: Mark Kennedy [mkennedy]
// 0 !LDRAW_ORG Primitive UPDATE 2010-01
// 0 !LICENSE Licensed under CC BY 4.0 : see CAreadme.txt
// 
// 0 BFC CERTIFY CCW
  [0,"BFC","CERTIFY"],
  [0,"BFC","CCW"],
// 
// 0 !HISTORY 2010-04-05 [PTadmin] Official Update 2010-01
// 
// 
// 1 16 0 0 0 1 0 0 0 1 0 0 0 1 4-4edge.dat
  [1,16,0,0,0,1,0,0,0,1,0,0,0,1, ldraw_lib__4_4edge()],
// 1 16 0 1 0 1 0 0 0 1 0 0 0 1 4-4edge.dat
  [1,16,0,1,0,1,0,0,0,1,0,0,0,1, ldraw_lib__4_4edge()],
// 1 16 0 0 0 1 0 0 0 1 0 0 0 1 4-4cyli.dat
  [1,16,0,0,0,1,0,0,0,1,0,0,0,1, ldraw_lib__4_4cyli()],
// 0
];
module ldraw_lib__4_4cylo(step=0, col=false, unit=2/5, alt=false, line=0.2, solid=!$preview)
    makepoly(ldraw_lib__4_4cylo(), step=step, col=col, unit=unit, alt=alt, line=line, solid=solid);
ldraw_lib__4_4cylo(line=0.2);
// file: ../p/1-16chrd.scad
use <../lib.scad>
use <empty.scad>
function ldraw_lib__1_16chrd() = [
// 0 Chord 0.0625
// 0 Name: 1-16chrd.dat
// 0 Author: Philippe Hurbain [Philo]
// 0 !LDRAW_ORG Primitive UPDATE 2015-01
// 0 !LICENSE Licensed under CC BY 4.0 : see CAreadme.txt
// 
// 0 BFC CERTIFY CCW
  [0,"BFC","CERTIFY"],
  [0,"BFC","CCW"],
// 
// 0 !HISTORY 2015-10-11 [PTadmin] Official Update 2015-01
// 
// 
// 0 // This file is intentionally empty because at the current \P resolution,
// 0 // an 1-16chrd is actually empty. However, this file still is present
// 0 // to allow tools to do primitives substition and fill in a real chrd here,
// 0 // or, if desired, to substitute this with the hi-res 48\1-16chrd.
// 
// 0 // This file is based on an idea by Darats at http://forums.ldraw.org/read.php?19,14500,14500#msg-14500
// 
// 1 16 0 0 0 1 0 0 0 1 0 0 0 1 empty.dat
  [1,16,0,0,0,1,0,0,0,1,0,0,0,1, ldraw_lib__empty()],
];
module ldraw_lib__1_16chrd(step=0, col=false, unit=2/5, alt=false, line=0.2, solid=!$preview)
    makepoly(ldraw_lib__1_16chrd(), step=step, col=col, unit=unit, alt=alt, line=line, solid=solid);
ldraw_lib__1_16chrd(line=0.2);
// file: s/98138s02.scad
use <../../lib.scad>
use <../../p/4-4cylo.scad>
use <../../p/4-4ring8.scad>
use <../../p/4-4ring9.scad>
use <../../p/stud4o.scad>
function ldraw_lib__s__98138s02() = [
// 0 ~Tile  1 x  1 Round with Groove without Complete Top Face
// 0 Name: s\98138s02.dat
// 0 Author: Magnus Forsberg [MagFors]
// 0 !LDRAW_ORG Subpart UPDATE 2020-01
// 0 !LICENSE Licensed under CC BY 4.0 : see CAreadme.txt
// 
// 0 BFC CERTIFY CCW
  [0,"BFC","CERTIFY"],
  [0,"BFC","CCW"],
// 
// 0 !HISTORY 2020-06-28 [PTadmin] Official Update 2020-01
// 
// 
// 1 16 0 4 0 1 0 0 0 -1 0 0 0 1 stud4o.dat
  [1,16,0,4,0,1,0,0,0,-1,0,0,0,1, ldraw_lib__stud4o()],
// 1 16 0 8 0 -1 0 0 0 -1 0 0 0 1 4-4ring8.dat
  [1,16,0,8,0,-1,0,0,0,-1,0,0,0,1, ldraw_lib__4_4ring8()],
// 1 16 0 7 0 9 0 0 0 1 0 0 0 9 4-4cylo.dat
  [1,16,0,7,0,9,0,0,0,1,0,0,0,9, ldraw_lib__4_4cylo()],
// 1 16 0 7 0 -1 0 0 0 -1 0 0 0 1 4-4ring9.dat
  [1,16,0,7,0,-1,0,0,0,-1,0,0,0,1, ldraw_lib__4_4ring9()],
// 1 16 0 0 0 10 0 0 0 7 0 0 0 10 4-4cylo.dat
  [1,16,0,0,0,10,0,0,0,7,0,0,0,10, ldraw_lib__4_4cylo()],
];
module ldraw_lib__s__98138s02(step=0, col=false, unit=2/5, alt=false, line=0.2, solid=!$preview)
    makepoly(ldraw_lib__s__98138s02(), step=step, col=col, unit=unit, alt=alt, line=line, solid=solid);
ldraw_lib__s__98138s02(line=0.2);
// file: ../p/4-4ering.scad
use <../lib.scad>
use <1-16chrd.scad>
function ldraw_lib__4_4ering() = [
// 0 Adapter Ring Triangles to Normal 1.0
// 0 Name: 4-4ering.dat
// 0 Author: Philippe Hurbain [Philo]
// 0 !LDRAW_ORG Primitive UPDATE 2015-01
// 0 !LICENSE Licensed under CC BY 4.0 : see CAreadme.txt
// 
// 0 BFC CERTIFY CCW
  [0,"BFC","CERTIFY"],
  [0,"BFC","CCW"],
// 
// 0 !HISTORY 2015-10-11 [PTadmin] Official Update 2015-01
// 
// 
// 0 // This file uses 1-16chrd (actually empty). It allows
// 0 // tools to do primitives substition and fill in a ring of chrd here,
// 0 // or, if desired, to substitute this with the hi-res 48\1-16chrd.
// 0 // This file is based on an idea by Darats at http://forums.ldraw.org/read.php?19,14500,14500#msg-14500
// 
// 1 16 0 0 0 1 0 0 0 1 0 0 0 1 1-16chrd.dat
  [1,16,0,0,0,1,0,0,0,1,0,0,0,1, ldraw_lib__1_16chrd()],
// 1 16 0 0 0 0.92388 0 0.38268 0 1 0 -0.38268 0 0.92388 1-16chrd.dat
  [1,16,0,0,0,0.92388,0,0.38268,0,1,0,-0.38268,0,0.92388, ldraw_lib__1_16chrd()],
// 1 16 0 0 0 0.70711 0 0.70711 0 1 0 -0.70711 0 0.70711 1-16chrd.dat
  [1,16,0,0,0,0.70711,0,0.70711,0,1,0,-0.70711,0,0.70711, ldraw_lib__1_16chrd()],
// 1 16 0 0 0 0.38268 0 0.92388 0 1 0 -0.92388 0 0.38268 1-16chrd.dat
  [1,16,0,0,0,0.38268,0,0.92388,0,1,0,-0.92388,0,0.38268, ldraw_lib__1_16chrd()],
// 1 16 0 0 0 0 0 1 0 1 0 -1 0 0 1-16chrd.dat
  [1,16,0,0,0,0,0,1,0,1,0,-1,0,0, ldraw_lib__1_16chrd()],
// 1 16 0 0 0 -0.38268 0 0.92388 0 1 0 -0.92388 0 -0.38268 1-16chrd.dat
  [1,16,0,0,0,-0.38268,0,0.92388,0,1,0,-0.92388,0,-0.38268, ldraw_lib__1_16chrd()],
// 1 16 0 0 0 -0.70711 0 0.70711 0 1 0 -0.70711 0 -0.70711 1-16chrd.dat
  [1,16,0,0,0,-0.70711,0,0.70711,0,1,0,-0.70711,0,-0.70711, ldraw_lib__1_16chrd()],
// 1 16 0 0 0 -0.92388 0 0.38268 0 1 0 -0.38268 0 -0.92388 1-16chrd.dat
  [1,16,0,0,0,-0.92388,0,0.38268,0,1,0,-0.38268,0,-0.92388, ldraw_lib__1_16chrd()],
// 1 16 0 0 0 0 0 -1 0 1 0 1 0 0 1-16chrd.dat
  [1,16,0,0,0,0,0,-1,0,1,0,1,0,0, ldraw_lib__1_16chrd()],
// 1 16 0 0 0 0.38268 0 -0.92388 0 1 0 0.92388 0 0.38268 1-16chrd.dat
  [1,16,0,0,0,0.38268,0,-0.92388,0,1,0,0.92388,0,0.38268, ldraw_lib__1_16chrd()],
// 1 16 0 0 0 0.70711 0 -0.70711 0 1 0 0.70711 0 0.70711 1-16chrd.dat
  [1,16,0,0,0,0.70711,0,-0.70711,0,1,0,0.70711,0,0.70711, ldraw_lib__1_16chrd()],
// 1 16 0 0 0 0.92388 0 -0.38268 0 1 0 0.38268 0 0.92388 1-16chrd.dat
  [1,16,0,0,0,0.92388,0,-0.38268,0,1,0,0.38268,0,0.92388, ldraw_lib__1_16chrd()],
// 1 16 0 0 0 -1 0 0 0 1 0 0 0 -1 1-16chrd.dat
  [1,16,0,0,0,-1,0,0,0,1,0,0,0,-1, ldraw_lib__1_16chrd()],
// 1 16 0 0 0 -0.92388 0 -0.38268 0 1 0 0.38268 0 -0.92388 1-16chrd.dat
  [1,16,0,0,0,-0.92388,0,-0.38268,0,1,0,0.38268,0,-0.92388, ldraw_lib__1_16chrd()],
// 1 16 0 0 0 -0.70711 0 -0.70711 0 1 0 0.70711 0 -0.70711 1-16chrd.dat
  [1,16,0,0,0,-0.70711,0,-0.70711,0,1,0,0.70711,0,-0.70711, ldraw_lib__1_16chrd()],
// 1 16 0 0 0 -0.38268 0 -0.92388 0 1 0 0.92388 0 -0.38268 1-16chrd.dat
  [1,16,0,0,0,-0.38268,0,-0.92388,0,1,0,0.92388,0,-0.38268, ldraw_lib__1_16chrd()],
];
module ldraw_lib__4_4ering(step=0, col=false, unit=2/5, alt=false, line=0.2, solid=!$preview)
    makepoly(ldraw_lib__4_4ering(), step=step, col=col, unit=unit, alt=alt, line=line, solid=solid);
ldraw_lib__4_4ering(line=0.2);
// file: ../p/4-4disc.scad
use <../lib.scad>
function ldraw_lib__4_4disc() = [
// 0 Disc 1.0
// 0 Name: 4-4disc.dat
// 0 Author: James Jessiman
// 0 !LDRAW_ORG Primitive UPDATE 2002-02
// 0 !LICENSE Licensed under CC BY 4.0 : see CAreadme.txt
// 
// 0 BFC CERTIFY CCW
  [0,"BFC","CERTIFY"],
  [0,"BFC","CCW"],
// 
// 0 !HISTORY 1998-12-15 [PTadmin] Official Update 1998-10
// 0 !HISTORY 2002-03-23 [sbliss] Added BFC statement
// 0 !HISTORY 2002-04-25 [PTadmin] Official Update 2002-02
// 0 !HISTORY 2007-06-24 [PTadmin] Header formatted for Contributor Agreement
// 0 !HISTORY 2008-07-01 [PTadmin] Official Update 2008-01
// 
// 
// 3 16 0 0 0 1 0 0 0.9239 0 0.3827
  [3,16,0,0,0,1,0,0,0.9239,0,0.3827],
// 3 16 0 0 0 0.9239 0 0.3827 0.7071 0 0.7071
  [3,16,0,0,0,0.9239,0,0.3827,0.7071,0,0.7071],
// 3 16 0 0 0 0.7071 0 0.7071 0.3827 0 0.9239
  [3,16,0,0,0,0.7071,0,0.7071,0.3827,0,0.9239],
// 3 16 0 0 0 0.3827 0 0.9239 0 0 1
  [3,16,0,0,0,0.3827,0,0.9239,0,0,1],
// 3 16 0 0 0 0 0 1 -0.3827 0 0.9239
  [3,16,0,0,0,0,0,1,-0.3827,0,0.9239],
// 3 16 0 0 0 -0.3827 0 0.9239 -0.7071 0 0.7071
  [3,16,0,0,0,-0.3827,0,0.9239,-0.7071,0,0.7071],
// 3 16 0 0 0 -0.7071 0 0.7071 -0.9239 0 0.3827
  [3,16,0,0,0,-0.7071,0,0.7071,-0.9239,0,0.3827],
// 3 16 0 0 0 -0.9239 0 0.3827 -1 0 -0
  [3,16,0,0,0,-0.9239,0,0.3827,-1,0,-0],
// 3 16 0 0 0 -1 0 -0 -0.9239 0 -0.3827
  [3,16,0,0,0,-1,0,-0,-0.9239,0,-0.3827],
// 3 16 0 0 0 -0.9239 0 -0.3827 -0.7071 0 -0.7071
  [3,16,0,0,0,-0.9239,0,-0.3827,-0.7071,0,-0.7071],
// 3 16 0 0 0 -0.7071 0 -0.7071 -0.3827 0 -0.9239
  [3,16,0,0,0,-0.7071,0,-0.7071,-0.3827,0,-0.9239],
// 3 16 0 0 0 -0.3827 0 -0.9239 0 0 -1
  [3,16,0,0,0,-0.3827,0,-0.9239,0,0,-1],
// 3 16 0 0 0 0 0 -1 0.3827 0 -0.9239
  [3,16,0,0,0,0,0,-1,0.3827,0,-0.9239],
// 3 16 0 0 0 0.3827 0 -0.9239 0.7071 0 -0.7071
  [3,16,0,0,0,0.3827,0,-0.9239,0.7071,0,-0.7071],
// 3 16 0 0 0 0.7071 0 -0.7071 0.9239 0 -0.3827
  [3,16,0,0,0,0.7071,0,-0.7071,0.9239,0,-0.3827],
// 3 16 0 0 0 0.9239 0 -0.3827 1 0 0
  [3,16,0,0,0,0.9239,0,-0.3827,1,0,0],
// 0
];
module ldraw_lib__4_4disc(step=0, col=false, unit=2/5, alt=false, line=0.2, solid=!$preview)
    makepoly(ldraw_lib__4_4disc(), step=step, col=col, unit=unit, alt=alt, line=line, solid=solid);
ldraw_lib__4_4disc(line=0.2);
// file: ../p/2-4ndis.scad
use <../lib.scad>
function ldraw_lib__2_4ndis() = [
// 0 Disc Negative 0.5
// 0 Name: 2-4ndis.dat
// 0 Author: James Jessiman
// 0 !LDRAW_ORG Primitive UPDATE 2012-01
// 0 !LICENSE Licensed under CC BY 4.0 : see CAreadme.txt
// 
// 0 BFC CERTIFY CCW
  [0,"BFC","CERTIFY"],
  [0,"BFC","CCW"],
// 
// 0 !HISTORY 2002-03-23 [sbliss] Added BFC statement; compacted code
// 0 !HISTORY 2002-04-25 [PTadmin] Official Update 2002-02
// 0 !HISTORY 2007-06-24 [PTadmin] Header formatted for Contributor Agreement
// 0 !HISTORY 2008-07-01 [PTadmin] Official Update 2008-01
// 0 !HISTORY 2012-02-16 [Philo] Changed to CCW
// 0 !HISTORY 2012-03-30 [PTadmin] Official Update 2012-01
// 
// 
// 3 16 0.9239 0 0.3827 1 0 0 1 0 1
  [3,16,0.9239,0,0.3827,1,0,0,1,0,1],
// 3 16 0.7071 0 0.7071 0.9239 0 0.3827 1 0 1
  [3,16,0.7071,0,0.7071,0.9239,0,0.3827,1,0,1],
// 3 16 0.3827 0 0.9239 0.7071 0 0.7071 1 0 1
  [3,16,0.3827,0,0.9239,0.7071,0,0.7071,1,0,1],
// 3 16 0 0 1 0.3827 0 0.9239 1 0 1
  [3,16,0,0,1,0.3827,0,0.9239,1,0,1],
// 3 16 -0.3827 0 0.9239 0 0 1 -1 0 1
  [3,16,-0.3827,0,0.9239,0,0,1,-1,0,1],
// 3 16 -0.7071 0 0.7071 -0.3827 0 0.9239 -1 0 1
  [3,16,-0.7071,0,0.7071,-0.3827,0,0.9239,-1,0,1],
// 3 16 -0.9239 0 0.3827 -0.7071 0 0.7071 -1 0 1
  [3,16,-0.9239,0,0.3827,-0.7071,0,0.7071,-1,0,1],
// 3 16 -1 0 0 -0.9239 0 0.3827 -1 0 1
  [3,16,-1,0,0,-0.9239,0,0.3827,-1,0,1],
];
module ldraw_lib__2_4ndis(step=0, col=false, unit=2/5, alt=false, line=0.2, solid=!$preview)
    makepoly(ldraw_lib__2_4ndis(), step=step, col=col, unit=unit, alt=alt, line=line, solid=solid);
ldraw_lib__2_4ndis(line=0.2);
// file: ../p/1-4tang.scad
use <../lib.scad>
function ldraw_lib__1_4tang() = [
// 0 Disc Negative Tangent 0.25
// 0 Name: 1-4tang.dat
// 0 Author: Willy Tschager [Holly-Wood]
// 0 !LDRAW_ORG Primitive UPDATE 2024-01
// 0 !LICENSE Licensed under CC BY 4.0 : see CAreadme.txt
// 
// 0 BFC CERTIFY CCW
  [0,"BFC","CERTIFY"],
  [0,"BFC","CCW"],
// 
// 0 !HISTORY 2011-12-29 [PTadmin] Official Update 2011-02
// 0 !HISTORY 2024-01-08 [Holly-Wood] Complete re-write, original by westrate
// 0 !HISTORY 2024-01-29 [OrionP] Official Update 2024-01
// 
// 3 16 0 0 1 0.3827 0 0.9239 0.1989 0 1
  [3,16,0,0,1,0.3827,0,0.9239,0.1989,0,1],
// 3 16 0.3827 0 0.9239 0.7071 0 0.7071 0.5665 0 0.8478
  [3,16,0.3827,0,0.9239,0.7071,0,0.7071,0.5665,0,0.8478],
// 3 16 0.7071 0 0.7071 0.9239 0 0.3827 0.8478 0 0.5665
  [3,16,0.7071,0,0.7071,0.9239,0,0.3827,0.8478,0,0.5665],
// 3 16 0.9239 0 0.3827 1 0 0 1 0 0.1989
  [3,16,0.9239,0,0.3827,1,0,0,1,0,0.1989],
];
module ldraw_lib__1_4tang(step=0, col=false, unit=2/5, alt=false, line=0.2, solid=!$preview)
    makepoly(ldraw_lib__1_4tang(), step=step, col=col, unit=unit, alt=alt, line=line, solid=solid);
ldraw_lib__1_4tang(line=0.2);
// main file
use <../lib.scad>
use <../p/1-4tang.scad>
use <../p/2-4ndis.scad>
use <../p/4-4disc.scad>
use <../p/4-4ering.scad>
use <s/98138s02.scad>
function ldraw_lib__98138p2e() = [
// 0 Tile  1 x  1 Round with Off-centred Black Dot Pattern
// 0 Name: 98138p2e.dat
// 0 Author: Vincent Messenet [Cheenzo]
// 0 !LDRAW_ORG Part UPDATE 2022-06
// 0 !LICENSE Licensed under CC BY 4.0 : see CAreadme.txt
// 
// 0 BFC CERTIFY CCW
  [0,"BFC","CERTIFY"],
  [0,"BFC","CCW"],
// 
// 0 !KEYWORDS Bricklink 98138pb265, Rebrickable 98138pr0273, Set 21331
// 
// 0 !HISTORY 2022-12-20 [PTadmin] Official Update 2022-06
// 
// 
// 1 16 0 0 0 1 0 0 0 1 0 0 0 1 s\98138s02.dat
  [1,16,0,0,0,1,0,0,0,1,0,0,0,1, ldraw_lib__s__98138s02()],
// 
// 1 16 0 0 0 10 0 0 0 1 0 0 0 10 4-4ering.dat
  [1,16,0,0,0,10,0,0,0,1,0,0,0,10, ldraw_lib__4_4ering()],
// 1 0 4.5 0 0 4.5 0 0 0 1 0 0 0 4.5 4-4disc.dat
  [1,0,4.5,0,0,4.5,0,0,0,1,0,0,0,4.5, ldraw_lib__4_4disc()],
// 1 16 4.5 0 0 0 0 -4.5 0 1 0 4.5 0 0 2-4ndis.dat
  [1,16,4.5,0,0,0,0,-4.5,0,1,0,4.5,0,0, ldraw_lib__2_4ndis()],
// 1 16 4.5 0 0 4.5 0 0 0 1 0 0 0 4.5 1-4tang.dat
  [1,16,4.5,0,0,4.5,0,0,0,1,0,0,0,4.5, ldraw_lib__1_4tang()],
// 1 16 4.5 0 0 4.5 0 0 0 1 0 0 0 -4.5 1-4tang.dat
  [1,16,4.5,0,0,4.5,0,0,0,1,0,0,0,-4.5, ldraw_lib__1_4tang()],
// 
// 4 16 -10 0 0 -9.239 0 -3.827 0 0 0 -9.239 0 3.827
  [4,16,-10,0,0,-9.239,0,-3.827,0,0,0,-9.239,0,3.827],
// 4 16 -9.239 0 3.827 0 0 0 0 0 4.5 -7.071 0 7.071
  [4,16,-9.239,0,3.827,0,0,0,0,0,4.5,-7.071,0,7.071],
// 4 16 -3.827 0 9.239 -7.071 0 7.071 0 0 4.5 0 0 10
  [4,16,-3.827,0,9.239,-7.071,0,7.071,0,0,4.5,0,0,10],
// 4 16 3.827 0 9.239 0 0 10 0 0 4.5 4.5 0 4.5
  [4,16,3.827,0,9.239,0,0,10,0,0,4.5,4.5,0,4.5],
// 4 16 -7.071 0 -7.071 0 0 -4.5 0 0 0 -9.239 0 -3.827
  [4,16,-7.071,0,-7.071,0,0,-4.5,0,0,0,-9.239,0,-3.827],
// 4 16 0 0 -10 0 0 -4.5 -7.071 0 -7.071 -3.827 0 -9.239
  [4,16,0,0,-10,0,0,-4.5,-7.071,0,-7.071,-3.827,0,-9.239],
// 4 16 0 0 -4.5 0 0 -10 3.827 0 -9.239 4.5 0 -4.5
  [4,16,0,0,-4.5,0,0,-10,3.827,0,-9.239,4.5,0,-4.5],
// 4 16 7.071 0 7.071 3.827 0 9.239 4.5 0 4.5 5.39505 0 4.5
  [4,16,7.071,0,7.071,3.827,0,9.239,4.5,0,4.5,5.39505,0,4.5],
// 3 16 7.071 0 7.071 5.39505 0 4.5 6.22215 0 4.15755
  [3,16,7.071,0,7.071,5.39505,0,4.5,6.22215,0,4.15755],
// 4 16 9.239 0 3.827 7.071 0 7.071 6.22215 0 4.15755 7.04925 0 3.8151
  [4,16,9.239,0,3.827,7.071,0,7.071,6.22215,0,4.15755,7.04925,0,3.8151],
// 3 16 9.239 0 3.827 7.04925 0 3.8151 7.68195 0 3.18195
  [3,16,9.239,0,3.827,7.04925,0,3.8151,7.68195,0,3.18195],
// 3 16 9.239 0 3.827 7.68195 0 3.18195 8.3151 0 2.54925
  [3,16,9.239,0,3.827,7.68195,0,3.18195,8.3151,0,2.54925],
// 3 16 9.239 0 3.827 8.3151 0 2.54925 8.65755 0 1.72215
  [3,16,9.239,0,3.827,8.3151,0,2.54925,8.65755,0,1.72215],
// 4 16 9.239 0 3.827 8.65755 0 1.72215 9 0 .89505 10 0 0
  [4,16,9.239,0,3.827,8.65755,0,1.72215,9,0,.89505,10,0,0],
// 3 16 10 0 0 9 0 .89505 9 0 0
  [3,16,10,0,0,9,0,.89505,9,0,0],
// 3 16 10 0 0 9 0 0 9 0 -.89505
  [3,16,10,0,0,9,0,0,9,0,-.89505],
// 4 16 9.239 0 -3.827 10 0 0 9 0 -.89505 8.65755 0 -1.72215
  [4,16,9.239,0,-3.827,10,0,0,9,0,-.89505,8.65755,0,-1.72215],
// 3 16 9.239 0 -3.827 8.65755 0 -1.72215 8.3151 0 -2.54925
  [3,16,9.239,0,-3.827,8.65755,0,-1.72215,8.3151,0,-2.54925],
// 3 16 9.239 0 -3.827 8.3151 0 -2.54925 7.68195 0 -3.18195
  [3,16,9.239,0,-3.827,8.3151,0,-2.54925,7.68195,0,-3.18195],
// 4 16 6.22215 0 -4.15755 7.071 0 -7.071 9.239 0 -3.827 7.04925 0 -3.8151
  [4,16,6.22215,0,-4.15755,7.071,0,-7.071,9.239,0,-3.827,7.04925,0,-3.8151],
// 3 16 9.239 0 -3.827 7.68195 0 -3.18195 7.04925 0 -3.8151
  [3,16,9.239,0,-3.827,7.68195,0,-3.18195,7.04925,0,-3.8151],
// 3 16 7.071 0 -7.071 6.22215 0 -4.15755 5.39505 0 -4.5
  [3,16,7.071,0,-7.071,6.22215,0,-4.15755,5.39505,0,-4.5],
// 4 16 5.39505 0 -4.5 4.5 0 -4.5 3.827 0 -9.239 7.071 0 -7.071
  [4,16,5.39505,0,-4.5,4.5,0,-4.5,3.827,0,-9.239,7.071,0,-7.071],
];
module ldraw_lib__98138p2e(step=0, col=false, unit=2/5, alt=false, line=0.2, solid=!$preview)
    makepoly(ldraw_lib__98138p2e(), step=step, col=col, unit=unit, alt=alt, line=line, solid=solid);
ldraw_lib__98138p2e(line=0.2);
